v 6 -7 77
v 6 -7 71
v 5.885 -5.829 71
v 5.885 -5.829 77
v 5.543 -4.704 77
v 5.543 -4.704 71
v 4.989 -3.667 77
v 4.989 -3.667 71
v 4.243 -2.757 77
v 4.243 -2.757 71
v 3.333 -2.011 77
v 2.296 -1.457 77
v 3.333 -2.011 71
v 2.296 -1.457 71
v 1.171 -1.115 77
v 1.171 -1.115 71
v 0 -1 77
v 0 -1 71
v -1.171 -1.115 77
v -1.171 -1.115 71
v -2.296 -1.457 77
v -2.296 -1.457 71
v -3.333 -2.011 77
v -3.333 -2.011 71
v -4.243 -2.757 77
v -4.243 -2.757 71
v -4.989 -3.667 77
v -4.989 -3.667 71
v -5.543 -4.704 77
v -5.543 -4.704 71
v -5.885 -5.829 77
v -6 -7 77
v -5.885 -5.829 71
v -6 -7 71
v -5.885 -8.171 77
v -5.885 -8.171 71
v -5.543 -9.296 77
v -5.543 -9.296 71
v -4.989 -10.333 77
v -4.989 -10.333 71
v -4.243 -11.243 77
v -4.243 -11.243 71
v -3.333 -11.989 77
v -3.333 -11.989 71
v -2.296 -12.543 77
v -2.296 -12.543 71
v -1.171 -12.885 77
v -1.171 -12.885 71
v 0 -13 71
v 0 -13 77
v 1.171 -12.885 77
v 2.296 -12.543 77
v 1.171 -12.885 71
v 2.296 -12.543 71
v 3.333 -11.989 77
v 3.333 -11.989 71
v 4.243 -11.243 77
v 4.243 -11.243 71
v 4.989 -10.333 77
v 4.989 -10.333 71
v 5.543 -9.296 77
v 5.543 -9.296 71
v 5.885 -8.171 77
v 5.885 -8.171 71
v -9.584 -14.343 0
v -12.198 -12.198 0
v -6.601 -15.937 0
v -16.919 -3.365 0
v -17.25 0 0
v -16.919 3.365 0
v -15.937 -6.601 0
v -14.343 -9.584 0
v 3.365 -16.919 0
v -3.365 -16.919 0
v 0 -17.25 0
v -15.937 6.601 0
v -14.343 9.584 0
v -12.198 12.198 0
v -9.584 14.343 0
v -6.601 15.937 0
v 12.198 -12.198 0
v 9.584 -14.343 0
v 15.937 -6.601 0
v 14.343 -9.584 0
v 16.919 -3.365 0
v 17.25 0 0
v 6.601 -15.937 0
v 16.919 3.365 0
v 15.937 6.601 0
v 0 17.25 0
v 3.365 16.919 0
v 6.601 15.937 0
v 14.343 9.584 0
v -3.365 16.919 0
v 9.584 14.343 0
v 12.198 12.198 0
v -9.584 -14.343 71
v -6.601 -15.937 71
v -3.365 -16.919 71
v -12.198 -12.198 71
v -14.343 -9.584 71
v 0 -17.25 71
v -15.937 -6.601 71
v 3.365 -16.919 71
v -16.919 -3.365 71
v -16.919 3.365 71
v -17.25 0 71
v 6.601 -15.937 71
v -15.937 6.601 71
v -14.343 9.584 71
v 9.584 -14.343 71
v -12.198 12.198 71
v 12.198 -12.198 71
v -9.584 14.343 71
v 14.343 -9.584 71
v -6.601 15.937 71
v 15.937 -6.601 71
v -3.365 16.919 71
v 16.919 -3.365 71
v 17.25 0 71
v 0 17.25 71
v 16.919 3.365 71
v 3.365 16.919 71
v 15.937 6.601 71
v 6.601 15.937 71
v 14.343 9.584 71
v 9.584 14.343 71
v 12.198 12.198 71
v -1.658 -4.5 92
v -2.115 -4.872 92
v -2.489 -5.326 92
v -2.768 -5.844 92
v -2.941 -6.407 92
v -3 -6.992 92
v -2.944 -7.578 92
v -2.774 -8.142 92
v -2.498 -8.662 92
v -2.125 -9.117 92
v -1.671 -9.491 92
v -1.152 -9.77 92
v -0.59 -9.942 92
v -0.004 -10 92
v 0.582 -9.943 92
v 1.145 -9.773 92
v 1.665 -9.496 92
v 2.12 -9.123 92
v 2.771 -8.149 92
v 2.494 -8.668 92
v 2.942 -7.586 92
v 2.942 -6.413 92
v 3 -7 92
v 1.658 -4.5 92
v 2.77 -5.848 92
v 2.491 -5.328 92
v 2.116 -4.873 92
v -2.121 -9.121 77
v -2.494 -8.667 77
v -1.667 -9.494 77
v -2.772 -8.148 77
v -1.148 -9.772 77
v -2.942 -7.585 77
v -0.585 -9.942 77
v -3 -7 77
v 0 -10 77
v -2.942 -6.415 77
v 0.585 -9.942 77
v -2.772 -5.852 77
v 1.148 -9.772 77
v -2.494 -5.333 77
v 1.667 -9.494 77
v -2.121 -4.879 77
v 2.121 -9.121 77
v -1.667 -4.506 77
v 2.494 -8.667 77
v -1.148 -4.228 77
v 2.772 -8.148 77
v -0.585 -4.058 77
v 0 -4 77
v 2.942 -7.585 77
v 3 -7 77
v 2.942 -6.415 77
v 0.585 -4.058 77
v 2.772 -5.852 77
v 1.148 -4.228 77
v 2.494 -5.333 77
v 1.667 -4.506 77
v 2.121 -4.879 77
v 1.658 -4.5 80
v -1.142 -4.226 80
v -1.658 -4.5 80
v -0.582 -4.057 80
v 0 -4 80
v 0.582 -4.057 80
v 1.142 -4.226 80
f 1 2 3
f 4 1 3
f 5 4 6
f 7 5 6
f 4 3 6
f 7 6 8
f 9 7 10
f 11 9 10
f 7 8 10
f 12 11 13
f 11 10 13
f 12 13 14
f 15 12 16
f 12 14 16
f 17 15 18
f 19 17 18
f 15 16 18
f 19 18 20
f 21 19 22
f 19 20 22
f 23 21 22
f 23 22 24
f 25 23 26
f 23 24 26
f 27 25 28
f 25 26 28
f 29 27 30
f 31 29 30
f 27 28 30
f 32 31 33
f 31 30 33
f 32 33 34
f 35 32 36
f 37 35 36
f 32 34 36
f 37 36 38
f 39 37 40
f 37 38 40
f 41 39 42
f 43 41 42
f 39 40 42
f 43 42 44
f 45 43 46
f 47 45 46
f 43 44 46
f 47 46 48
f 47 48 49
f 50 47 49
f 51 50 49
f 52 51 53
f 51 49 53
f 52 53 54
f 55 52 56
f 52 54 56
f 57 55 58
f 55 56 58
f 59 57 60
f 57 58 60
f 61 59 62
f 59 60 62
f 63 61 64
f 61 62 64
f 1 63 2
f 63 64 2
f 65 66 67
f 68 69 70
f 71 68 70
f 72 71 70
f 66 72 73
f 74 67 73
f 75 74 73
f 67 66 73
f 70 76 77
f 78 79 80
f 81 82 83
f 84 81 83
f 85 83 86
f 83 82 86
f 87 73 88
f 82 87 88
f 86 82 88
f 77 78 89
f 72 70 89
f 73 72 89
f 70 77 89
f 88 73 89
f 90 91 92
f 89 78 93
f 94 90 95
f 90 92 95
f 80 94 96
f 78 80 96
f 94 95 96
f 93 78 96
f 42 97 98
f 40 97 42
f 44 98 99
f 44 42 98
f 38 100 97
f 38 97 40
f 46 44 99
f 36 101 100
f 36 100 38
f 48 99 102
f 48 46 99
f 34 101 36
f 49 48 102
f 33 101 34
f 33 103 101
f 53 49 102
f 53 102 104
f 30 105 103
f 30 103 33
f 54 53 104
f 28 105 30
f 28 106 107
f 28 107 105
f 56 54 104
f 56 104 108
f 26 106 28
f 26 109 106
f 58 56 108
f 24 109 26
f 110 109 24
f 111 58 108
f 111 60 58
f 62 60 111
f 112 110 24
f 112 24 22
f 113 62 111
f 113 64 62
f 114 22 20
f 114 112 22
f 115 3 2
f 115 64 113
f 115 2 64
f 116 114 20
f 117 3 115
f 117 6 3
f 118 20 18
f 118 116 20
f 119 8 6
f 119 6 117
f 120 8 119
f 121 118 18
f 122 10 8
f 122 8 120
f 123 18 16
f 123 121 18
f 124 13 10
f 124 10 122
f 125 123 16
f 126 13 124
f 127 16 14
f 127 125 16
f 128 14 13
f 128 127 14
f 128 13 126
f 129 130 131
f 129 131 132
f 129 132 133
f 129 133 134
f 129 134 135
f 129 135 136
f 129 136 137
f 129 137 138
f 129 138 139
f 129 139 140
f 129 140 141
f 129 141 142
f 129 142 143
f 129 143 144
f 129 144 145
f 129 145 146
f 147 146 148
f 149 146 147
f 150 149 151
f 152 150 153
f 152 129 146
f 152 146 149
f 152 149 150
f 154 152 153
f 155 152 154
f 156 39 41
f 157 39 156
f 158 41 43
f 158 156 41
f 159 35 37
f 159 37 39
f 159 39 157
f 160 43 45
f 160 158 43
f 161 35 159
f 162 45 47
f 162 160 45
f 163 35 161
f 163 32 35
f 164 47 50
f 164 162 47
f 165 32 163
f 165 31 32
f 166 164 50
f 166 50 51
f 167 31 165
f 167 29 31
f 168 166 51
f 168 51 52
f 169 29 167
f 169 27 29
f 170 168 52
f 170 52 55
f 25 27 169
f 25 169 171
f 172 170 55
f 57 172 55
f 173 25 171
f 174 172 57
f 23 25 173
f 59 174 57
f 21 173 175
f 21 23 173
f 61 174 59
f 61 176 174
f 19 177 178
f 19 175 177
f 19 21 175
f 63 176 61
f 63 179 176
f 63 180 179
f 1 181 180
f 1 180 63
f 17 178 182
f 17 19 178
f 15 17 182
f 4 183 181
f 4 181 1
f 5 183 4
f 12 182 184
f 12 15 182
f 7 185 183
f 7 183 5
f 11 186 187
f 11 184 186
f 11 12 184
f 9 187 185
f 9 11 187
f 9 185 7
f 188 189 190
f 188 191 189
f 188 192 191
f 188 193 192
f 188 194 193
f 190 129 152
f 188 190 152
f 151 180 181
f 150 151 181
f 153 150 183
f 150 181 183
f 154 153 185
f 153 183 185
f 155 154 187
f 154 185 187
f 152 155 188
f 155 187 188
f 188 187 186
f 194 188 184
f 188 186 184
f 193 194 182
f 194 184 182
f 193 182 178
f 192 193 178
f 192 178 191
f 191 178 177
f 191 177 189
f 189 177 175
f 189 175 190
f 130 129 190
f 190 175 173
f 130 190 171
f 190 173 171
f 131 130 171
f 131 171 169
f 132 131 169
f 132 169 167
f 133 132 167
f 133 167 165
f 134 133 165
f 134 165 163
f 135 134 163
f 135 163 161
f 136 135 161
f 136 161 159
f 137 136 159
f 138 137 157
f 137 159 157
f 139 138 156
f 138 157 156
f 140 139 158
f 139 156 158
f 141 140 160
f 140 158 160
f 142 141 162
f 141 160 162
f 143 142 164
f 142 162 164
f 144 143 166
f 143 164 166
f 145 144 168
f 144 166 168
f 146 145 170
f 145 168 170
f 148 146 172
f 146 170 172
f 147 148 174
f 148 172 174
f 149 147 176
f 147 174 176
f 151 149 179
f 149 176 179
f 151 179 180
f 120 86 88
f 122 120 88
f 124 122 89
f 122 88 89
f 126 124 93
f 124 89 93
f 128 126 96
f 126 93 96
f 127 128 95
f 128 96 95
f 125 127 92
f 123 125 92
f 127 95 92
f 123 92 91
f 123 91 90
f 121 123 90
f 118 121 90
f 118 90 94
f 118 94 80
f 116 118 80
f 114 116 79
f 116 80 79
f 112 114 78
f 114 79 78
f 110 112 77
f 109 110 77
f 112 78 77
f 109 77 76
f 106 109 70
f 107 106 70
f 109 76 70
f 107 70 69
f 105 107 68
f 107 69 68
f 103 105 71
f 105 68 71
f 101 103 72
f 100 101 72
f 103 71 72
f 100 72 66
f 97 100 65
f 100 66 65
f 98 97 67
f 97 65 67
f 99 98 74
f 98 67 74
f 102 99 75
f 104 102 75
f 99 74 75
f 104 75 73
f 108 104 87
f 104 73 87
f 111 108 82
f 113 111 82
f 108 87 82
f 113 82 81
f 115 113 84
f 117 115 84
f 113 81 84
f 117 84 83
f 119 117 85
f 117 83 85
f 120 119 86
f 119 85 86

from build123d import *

# Parameters (mm, degrees)
SKETCH_1_R          = 17.25
EXTRUDE_1_DEPTH     = 71
SKETCH_2_R          = 6
EXTRUDE_2_DEPTH     = 6
SKETCH_3_R          = 3
EXTRUDE_3_DEPTH     = 15
CUT_EXTRUDE_1_DEPTH = 12


with BuildPart() as part:
    # 草图1 → 凸台-拉伸1 (new body)
    with BuildSketch(Plane.XY):
        Circle(SKETCH_1_R)
    extrude(amount=EXTRUDE_1_DEPTH)

    # 草图2 → 凸台-拉伸2 (add)
    with BuildSketch(Plane.XY.offset(71)):
        with Locations((0, -7)):
            Circle(SKETCH_2_R)
    extrude(amount=EXTRUDE_2_DEPTH)

    # 草图3 → 凸台-拉伸3 (add)
    with BuildSketch(Plane.XY.offset(77)):
        with Locations((0, -7)):
            Circle(SKETCH_3_R)
    extrude(amount=EXTRUDE_3_DEPTH)

    # 草图4 → 切除-拉伸1 (cut)
    with BuildSketch(Plane.XY.offset(92)):
        Polygon((-3.407266726, -4.5), (4.657639837, -4.5), (3.969934626, -3.172821768), (-3.407266726, -3.172821768), align=None)
    extrude(amount=-CUT_EXTRUDE_1_DEPTH, mode=Mode.SUBTRACT)


solid = part.part
